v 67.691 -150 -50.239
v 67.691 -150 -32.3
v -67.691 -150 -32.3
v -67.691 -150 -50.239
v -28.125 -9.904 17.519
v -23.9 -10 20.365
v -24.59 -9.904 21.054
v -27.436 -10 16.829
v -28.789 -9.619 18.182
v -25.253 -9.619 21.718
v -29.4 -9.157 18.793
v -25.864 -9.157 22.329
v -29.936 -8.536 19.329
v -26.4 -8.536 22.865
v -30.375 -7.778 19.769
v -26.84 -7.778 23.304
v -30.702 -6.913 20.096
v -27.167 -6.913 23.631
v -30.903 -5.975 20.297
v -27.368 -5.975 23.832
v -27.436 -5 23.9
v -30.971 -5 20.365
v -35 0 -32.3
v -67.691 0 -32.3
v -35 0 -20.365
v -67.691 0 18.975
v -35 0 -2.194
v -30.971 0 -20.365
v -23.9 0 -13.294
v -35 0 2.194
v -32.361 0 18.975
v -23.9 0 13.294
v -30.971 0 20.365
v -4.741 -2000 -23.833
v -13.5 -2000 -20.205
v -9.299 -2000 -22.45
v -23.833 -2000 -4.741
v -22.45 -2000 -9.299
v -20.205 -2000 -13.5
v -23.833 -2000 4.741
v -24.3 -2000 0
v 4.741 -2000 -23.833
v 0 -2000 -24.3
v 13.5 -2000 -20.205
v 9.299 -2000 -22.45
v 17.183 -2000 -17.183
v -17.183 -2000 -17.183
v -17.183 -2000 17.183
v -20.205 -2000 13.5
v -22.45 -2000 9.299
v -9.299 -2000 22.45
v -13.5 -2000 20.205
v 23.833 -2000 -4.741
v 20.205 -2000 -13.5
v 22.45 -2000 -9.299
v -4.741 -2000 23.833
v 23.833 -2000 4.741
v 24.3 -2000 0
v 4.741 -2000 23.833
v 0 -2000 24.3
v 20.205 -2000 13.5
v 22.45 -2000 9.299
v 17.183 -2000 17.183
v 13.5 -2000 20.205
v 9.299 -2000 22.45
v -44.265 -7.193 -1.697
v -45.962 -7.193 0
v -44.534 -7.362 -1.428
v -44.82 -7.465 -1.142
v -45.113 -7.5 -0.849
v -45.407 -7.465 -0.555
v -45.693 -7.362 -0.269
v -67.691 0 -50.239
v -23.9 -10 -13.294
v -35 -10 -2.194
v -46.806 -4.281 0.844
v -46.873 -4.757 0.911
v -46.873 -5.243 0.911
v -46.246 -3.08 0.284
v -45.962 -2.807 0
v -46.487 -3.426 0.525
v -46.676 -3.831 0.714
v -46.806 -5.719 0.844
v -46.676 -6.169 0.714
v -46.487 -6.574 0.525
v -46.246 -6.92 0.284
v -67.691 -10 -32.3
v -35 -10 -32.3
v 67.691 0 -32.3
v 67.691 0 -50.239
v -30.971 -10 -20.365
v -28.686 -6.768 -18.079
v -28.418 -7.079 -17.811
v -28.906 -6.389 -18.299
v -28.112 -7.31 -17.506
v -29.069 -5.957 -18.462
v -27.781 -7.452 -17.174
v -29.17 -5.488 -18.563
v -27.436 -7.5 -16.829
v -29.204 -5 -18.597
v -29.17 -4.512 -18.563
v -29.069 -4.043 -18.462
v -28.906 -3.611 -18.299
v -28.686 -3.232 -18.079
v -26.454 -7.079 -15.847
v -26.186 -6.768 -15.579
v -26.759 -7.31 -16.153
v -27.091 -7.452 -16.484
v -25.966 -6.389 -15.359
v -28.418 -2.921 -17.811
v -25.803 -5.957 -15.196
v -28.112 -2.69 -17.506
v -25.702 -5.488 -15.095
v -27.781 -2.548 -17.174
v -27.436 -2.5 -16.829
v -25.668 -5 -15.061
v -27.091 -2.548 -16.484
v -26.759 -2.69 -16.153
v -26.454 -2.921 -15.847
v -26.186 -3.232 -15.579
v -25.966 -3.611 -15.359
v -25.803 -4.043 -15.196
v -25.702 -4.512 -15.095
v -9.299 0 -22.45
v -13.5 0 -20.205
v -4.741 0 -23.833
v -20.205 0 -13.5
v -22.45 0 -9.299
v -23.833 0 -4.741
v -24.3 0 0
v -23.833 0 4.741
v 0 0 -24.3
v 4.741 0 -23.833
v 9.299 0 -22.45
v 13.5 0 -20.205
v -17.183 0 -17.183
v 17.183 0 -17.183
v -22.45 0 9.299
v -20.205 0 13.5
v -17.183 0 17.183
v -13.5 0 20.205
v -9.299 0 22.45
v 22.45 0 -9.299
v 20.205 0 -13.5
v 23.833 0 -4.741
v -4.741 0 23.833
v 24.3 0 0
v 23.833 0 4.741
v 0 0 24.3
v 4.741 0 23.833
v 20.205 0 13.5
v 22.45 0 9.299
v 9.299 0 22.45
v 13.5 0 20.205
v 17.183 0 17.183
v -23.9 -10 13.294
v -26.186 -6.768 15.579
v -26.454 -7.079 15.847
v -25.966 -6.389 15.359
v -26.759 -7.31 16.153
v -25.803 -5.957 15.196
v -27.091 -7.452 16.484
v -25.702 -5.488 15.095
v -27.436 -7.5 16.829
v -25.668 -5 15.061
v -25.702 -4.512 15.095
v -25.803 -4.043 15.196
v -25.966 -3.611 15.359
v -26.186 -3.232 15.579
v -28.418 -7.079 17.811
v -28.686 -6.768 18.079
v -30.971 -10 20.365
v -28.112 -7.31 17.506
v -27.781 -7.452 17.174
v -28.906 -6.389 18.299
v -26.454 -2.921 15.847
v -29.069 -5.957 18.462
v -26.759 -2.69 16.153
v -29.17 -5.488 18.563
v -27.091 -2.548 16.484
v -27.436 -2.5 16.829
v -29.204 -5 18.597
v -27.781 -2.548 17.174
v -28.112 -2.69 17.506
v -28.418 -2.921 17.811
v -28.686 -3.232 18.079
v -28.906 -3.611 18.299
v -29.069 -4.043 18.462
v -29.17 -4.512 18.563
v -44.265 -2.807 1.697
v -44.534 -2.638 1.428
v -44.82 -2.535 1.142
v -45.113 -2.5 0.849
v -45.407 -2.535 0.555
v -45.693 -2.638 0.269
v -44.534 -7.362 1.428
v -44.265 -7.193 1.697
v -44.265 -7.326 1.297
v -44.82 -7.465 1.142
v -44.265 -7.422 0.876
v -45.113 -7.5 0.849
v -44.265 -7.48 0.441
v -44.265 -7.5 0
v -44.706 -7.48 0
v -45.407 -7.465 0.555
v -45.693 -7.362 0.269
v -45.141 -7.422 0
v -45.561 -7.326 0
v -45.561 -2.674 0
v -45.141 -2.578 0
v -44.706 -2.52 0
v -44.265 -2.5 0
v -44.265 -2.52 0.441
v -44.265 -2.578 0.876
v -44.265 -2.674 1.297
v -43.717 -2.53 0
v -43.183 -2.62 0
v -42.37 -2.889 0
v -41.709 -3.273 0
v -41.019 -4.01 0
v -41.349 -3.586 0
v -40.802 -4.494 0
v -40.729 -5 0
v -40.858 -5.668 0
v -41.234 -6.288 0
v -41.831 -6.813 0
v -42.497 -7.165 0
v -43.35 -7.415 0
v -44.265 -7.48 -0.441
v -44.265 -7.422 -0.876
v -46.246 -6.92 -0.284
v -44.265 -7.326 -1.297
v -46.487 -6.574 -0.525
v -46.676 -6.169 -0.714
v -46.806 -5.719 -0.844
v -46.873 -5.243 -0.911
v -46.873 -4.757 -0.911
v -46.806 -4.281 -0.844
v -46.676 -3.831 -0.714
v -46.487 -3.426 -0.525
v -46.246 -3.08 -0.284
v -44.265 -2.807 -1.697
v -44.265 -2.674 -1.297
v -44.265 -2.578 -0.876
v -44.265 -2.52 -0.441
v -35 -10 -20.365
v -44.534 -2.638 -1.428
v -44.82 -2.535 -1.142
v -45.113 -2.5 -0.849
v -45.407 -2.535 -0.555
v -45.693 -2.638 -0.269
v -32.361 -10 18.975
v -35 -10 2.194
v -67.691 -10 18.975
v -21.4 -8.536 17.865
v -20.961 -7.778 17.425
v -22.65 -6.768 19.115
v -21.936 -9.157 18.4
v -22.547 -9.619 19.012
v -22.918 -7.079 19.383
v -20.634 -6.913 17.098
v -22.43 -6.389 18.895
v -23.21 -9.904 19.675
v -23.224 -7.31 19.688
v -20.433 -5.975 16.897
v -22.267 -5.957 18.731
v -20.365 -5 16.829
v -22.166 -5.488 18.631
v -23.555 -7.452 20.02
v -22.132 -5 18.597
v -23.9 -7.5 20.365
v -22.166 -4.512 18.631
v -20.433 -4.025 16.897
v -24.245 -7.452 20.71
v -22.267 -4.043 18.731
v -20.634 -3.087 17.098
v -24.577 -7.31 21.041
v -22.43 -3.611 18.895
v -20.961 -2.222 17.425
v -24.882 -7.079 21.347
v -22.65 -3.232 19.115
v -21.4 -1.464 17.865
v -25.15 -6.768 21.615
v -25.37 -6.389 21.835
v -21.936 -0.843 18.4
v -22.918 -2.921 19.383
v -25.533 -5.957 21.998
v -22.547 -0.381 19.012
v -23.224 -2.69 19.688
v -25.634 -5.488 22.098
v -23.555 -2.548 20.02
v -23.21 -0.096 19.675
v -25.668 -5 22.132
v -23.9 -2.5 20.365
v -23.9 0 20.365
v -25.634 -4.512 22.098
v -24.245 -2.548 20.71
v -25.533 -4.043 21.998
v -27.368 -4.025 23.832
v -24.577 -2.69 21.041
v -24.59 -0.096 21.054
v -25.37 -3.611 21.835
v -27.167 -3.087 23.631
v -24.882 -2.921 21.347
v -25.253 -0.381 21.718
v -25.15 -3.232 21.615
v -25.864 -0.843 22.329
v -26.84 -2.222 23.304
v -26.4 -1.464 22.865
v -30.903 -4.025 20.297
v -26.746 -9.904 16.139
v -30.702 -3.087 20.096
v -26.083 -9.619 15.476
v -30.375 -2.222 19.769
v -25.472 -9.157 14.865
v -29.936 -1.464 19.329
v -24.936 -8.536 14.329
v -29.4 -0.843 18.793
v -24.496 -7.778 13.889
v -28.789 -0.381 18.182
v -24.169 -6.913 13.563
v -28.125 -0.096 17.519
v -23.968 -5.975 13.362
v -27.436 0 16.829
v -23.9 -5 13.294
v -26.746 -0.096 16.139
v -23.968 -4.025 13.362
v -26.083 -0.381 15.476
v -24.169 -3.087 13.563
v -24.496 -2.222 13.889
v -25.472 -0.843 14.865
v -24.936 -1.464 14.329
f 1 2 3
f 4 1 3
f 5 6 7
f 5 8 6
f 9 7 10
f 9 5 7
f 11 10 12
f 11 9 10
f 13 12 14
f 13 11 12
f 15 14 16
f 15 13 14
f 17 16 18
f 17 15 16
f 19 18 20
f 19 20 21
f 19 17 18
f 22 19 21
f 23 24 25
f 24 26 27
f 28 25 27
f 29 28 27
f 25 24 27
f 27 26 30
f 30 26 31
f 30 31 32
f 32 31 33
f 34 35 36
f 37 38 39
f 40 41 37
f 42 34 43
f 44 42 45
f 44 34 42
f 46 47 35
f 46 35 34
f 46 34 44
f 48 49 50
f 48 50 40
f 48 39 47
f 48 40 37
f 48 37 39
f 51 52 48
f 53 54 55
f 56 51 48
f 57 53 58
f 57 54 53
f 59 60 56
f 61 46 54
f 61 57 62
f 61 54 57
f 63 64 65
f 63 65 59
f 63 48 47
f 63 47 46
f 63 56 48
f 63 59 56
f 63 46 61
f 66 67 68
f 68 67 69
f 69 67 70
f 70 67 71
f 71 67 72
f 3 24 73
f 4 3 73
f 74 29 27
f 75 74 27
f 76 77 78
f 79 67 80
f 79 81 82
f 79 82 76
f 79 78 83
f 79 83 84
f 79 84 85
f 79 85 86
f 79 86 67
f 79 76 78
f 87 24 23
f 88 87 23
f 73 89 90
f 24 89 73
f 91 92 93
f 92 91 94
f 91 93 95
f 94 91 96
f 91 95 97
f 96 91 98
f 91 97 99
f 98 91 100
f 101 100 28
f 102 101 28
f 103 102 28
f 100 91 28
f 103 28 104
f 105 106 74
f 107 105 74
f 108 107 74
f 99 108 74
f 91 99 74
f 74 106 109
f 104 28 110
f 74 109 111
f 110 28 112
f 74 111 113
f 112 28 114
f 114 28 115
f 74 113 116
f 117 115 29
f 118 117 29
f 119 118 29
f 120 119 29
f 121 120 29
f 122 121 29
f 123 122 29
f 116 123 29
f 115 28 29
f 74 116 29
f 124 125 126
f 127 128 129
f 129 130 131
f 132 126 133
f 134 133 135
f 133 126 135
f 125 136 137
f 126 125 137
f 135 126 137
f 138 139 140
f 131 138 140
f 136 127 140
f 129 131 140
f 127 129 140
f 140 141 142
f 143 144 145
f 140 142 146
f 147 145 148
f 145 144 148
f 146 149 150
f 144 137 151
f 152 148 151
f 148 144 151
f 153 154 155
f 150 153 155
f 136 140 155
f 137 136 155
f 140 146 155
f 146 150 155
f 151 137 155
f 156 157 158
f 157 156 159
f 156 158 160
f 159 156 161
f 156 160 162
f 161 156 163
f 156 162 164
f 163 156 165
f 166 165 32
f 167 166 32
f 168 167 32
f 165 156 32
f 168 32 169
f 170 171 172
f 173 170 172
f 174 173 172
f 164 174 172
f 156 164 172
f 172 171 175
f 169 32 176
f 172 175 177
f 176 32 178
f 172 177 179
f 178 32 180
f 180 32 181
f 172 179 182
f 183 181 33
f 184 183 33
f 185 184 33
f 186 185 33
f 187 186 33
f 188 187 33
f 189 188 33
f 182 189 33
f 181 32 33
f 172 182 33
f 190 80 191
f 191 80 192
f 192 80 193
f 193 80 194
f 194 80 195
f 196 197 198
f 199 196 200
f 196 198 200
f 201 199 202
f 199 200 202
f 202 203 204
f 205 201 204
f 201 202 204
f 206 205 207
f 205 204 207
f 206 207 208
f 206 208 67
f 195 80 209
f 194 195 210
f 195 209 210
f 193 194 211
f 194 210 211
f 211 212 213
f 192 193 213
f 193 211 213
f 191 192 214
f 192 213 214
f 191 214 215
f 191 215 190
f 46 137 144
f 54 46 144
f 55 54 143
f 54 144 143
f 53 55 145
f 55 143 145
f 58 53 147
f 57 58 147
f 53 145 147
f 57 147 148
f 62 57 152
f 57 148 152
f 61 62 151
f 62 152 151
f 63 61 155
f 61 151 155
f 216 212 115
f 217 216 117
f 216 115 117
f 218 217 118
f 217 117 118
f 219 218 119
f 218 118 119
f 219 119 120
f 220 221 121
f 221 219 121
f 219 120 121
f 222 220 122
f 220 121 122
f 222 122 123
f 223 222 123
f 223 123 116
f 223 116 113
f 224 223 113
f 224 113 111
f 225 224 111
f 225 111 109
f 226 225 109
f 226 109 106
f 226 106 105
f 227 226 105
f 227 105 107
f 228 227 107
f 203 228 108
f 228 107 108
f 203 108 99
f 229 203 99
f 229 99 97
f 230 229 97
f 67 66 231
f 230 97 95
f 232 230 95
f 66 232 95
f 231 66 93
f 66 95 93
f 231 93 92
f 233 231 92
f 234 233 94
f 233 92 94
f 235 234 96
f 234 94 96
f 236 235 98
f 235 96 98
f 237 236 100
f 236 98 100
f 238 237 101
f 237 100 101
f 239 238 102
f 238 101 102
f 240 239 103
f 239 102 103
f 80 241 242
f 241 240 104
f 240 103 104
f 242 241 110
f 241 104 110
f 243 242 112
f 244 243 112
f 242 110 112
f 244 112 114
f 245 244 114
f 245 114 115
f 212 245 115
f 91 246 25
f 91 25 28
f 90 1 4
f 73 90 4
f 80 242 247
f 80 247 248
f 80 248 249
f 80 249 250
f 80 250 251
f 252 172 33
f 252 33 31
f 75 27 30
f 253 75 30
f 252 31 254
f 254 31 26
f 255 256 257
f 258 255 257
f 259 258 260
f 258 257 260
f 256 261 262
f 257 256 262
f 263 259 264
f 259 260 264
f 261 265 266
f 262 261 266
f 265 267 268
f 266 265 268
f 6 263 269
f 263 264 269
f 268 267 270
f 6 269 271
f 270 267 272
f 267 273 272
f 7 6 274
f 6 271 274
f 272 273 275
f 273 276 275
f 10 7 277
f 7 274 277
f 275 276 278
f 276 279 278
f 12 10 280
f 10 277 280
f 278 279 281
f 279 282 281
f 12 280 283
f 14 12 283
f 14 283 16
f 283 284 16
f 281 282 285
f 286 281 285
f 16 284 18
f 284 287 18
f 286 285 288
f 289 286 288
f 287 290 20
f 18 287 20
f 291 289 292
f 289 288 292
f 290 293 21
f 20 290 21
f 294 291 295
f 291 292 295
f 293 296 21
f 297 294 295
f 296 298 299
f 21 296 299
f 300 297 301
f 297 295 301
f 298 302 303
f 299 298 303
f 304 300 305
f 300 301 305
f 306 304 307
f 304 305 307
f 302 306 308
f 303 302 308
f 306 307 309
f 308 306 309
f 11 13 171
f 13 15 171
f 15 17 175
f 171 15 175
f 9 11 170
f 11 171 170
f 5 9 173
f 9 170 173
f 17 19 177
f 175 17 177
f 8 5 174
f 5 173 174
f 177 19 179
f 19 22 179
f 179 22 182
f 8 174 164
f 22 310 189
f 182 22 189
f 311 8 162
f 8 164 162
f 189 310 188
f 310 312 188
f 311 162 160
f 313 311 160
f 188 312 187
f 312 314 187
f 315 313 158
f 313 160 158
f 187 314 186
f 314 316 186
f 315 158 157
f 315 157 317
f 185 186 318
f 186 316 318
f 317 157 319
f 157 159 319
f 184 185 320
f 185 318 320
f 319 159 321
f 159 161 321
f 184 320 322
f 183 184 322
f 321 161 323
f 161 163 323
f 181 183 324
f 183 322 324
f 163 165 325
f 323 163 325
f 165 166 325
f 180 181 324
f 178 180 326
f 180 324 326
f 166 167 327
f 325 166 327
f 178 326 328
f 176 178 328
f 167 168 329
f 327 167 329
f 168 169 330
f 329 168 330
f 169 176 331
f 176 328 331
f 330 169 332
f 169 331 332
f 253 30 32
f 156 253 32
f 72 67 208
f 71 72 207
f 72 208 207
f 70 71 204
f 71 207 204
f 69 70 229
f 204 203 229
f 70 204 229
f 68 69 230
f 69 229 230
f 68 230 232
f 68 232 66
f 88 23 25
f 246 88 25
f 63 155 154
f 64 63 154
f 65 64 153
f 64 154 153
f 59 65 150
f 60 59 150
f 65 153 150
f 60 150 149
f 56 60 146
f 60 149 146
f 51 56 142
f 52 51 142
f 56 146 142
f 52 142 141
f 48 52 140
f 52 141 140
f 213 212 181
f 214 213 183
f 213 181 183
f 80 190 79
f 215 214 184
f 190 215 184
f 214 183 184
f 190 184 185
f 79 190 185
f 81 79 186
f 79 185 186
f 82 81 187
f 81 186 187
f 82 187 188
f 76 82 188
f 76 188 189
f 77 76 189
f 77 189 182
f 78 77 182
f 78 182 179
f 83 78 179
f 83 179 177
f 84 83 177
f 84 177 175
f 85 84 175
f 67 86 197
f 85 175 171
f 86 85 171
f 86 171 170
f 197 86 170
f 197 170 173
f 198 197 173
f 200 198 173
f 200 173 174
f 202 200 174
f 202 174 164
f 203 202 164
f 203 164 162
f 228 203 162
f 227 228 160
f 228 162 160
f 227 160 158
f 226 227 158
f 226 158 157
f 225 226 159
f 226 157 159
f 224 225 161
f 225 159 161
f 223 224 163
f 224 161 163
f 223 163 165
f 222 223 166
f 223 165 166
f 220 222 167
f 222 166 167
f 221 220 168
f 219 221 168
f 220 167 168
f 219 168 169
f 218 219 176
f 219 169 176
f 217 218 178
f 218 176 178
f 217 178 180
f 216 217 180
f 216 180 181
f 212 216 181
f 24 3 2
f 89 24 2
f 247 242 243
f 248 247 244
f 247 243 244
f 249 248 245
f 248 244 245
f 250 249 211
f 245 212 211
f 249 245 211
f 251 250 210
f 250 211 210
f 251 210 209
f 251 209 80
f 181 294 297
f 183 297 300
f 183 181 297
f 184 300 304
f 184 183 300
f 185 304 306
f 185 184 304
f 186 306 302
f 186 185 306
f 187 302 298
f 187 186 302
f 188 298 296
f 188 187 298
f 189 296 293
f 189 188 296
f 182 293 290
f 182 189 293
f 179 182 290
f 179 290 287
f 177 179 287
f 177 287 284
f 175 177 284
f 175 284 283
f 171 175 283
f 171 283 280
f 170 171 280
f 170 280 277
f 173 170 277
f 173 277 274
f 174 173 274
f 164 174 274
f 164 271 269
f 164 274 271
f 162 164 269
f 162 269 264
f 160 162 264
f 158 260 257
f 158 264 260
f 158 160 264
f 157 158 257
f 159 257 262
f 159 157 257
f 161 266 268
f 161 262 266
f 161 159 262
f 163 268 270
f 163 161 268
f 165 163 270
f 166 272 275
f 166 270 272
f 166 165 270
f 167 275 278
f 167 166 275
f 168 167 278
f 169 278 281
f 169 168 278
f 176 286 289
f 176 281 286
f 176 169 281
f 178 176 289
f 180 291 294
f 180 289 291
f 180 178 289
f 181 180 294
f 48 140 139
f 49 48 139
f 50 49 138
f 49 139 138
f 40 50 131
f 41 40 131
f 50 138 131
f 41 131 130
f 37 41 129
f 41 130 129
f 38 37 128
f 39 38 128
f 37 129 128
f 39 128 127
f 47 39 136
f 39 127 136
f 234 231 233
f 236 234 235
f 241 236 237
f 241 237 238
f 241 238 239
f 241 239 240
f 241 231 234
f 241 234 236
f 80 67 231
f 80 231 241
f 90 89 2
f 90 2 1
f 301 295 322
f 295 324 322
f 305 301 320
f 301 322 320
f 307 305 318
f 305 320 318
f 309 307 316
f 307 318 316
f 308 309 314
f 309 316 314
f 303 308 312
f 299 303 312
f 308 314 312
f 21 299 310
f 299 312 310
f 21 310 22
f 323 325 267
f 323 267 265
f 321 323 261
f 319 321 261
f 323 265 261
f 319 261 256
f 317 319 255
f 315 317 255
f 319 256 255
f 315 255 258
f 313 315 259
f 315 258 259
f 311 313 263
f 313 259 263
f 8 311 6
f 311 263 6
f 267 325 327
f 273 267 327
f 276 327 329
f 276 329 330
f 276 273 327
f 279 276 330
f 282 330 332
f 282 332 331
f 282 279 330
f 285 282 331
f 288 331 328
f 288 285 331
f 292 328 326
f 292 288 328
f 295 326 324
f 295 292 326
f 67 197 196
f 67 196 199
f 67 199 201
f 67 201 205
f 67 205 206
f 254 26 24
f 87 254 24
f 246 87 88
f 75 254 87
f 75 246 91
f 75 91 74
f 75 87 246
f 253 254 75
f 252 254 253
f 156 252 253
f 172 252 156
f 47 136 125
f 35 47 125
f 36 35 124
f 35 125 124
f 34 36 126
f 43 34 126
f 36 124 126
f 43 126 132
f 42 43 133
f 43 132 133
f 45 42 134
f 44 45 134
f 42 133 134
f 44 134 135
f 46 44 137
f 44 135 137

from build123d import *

# Parameters (mm, degrees)
F1_DEPTH  = 2000
F2_DEPTH  = 10
F3_R      = 2.5
F4_DEPTH  = 25
F5_R      = 2.5
F6_DEPTH  = 25
F7_DEPTH  = 150
F9_DEPTH  = 10
F10_DEPTH = 25
F11_R     = 4.99999


# Not quite as in the source:
# - a fillet or chamfer is up to 0.001 mm smaller than in the source, because OpenCascade refuses the exact size


with BuildPart() as f1:
    # F0 (on Front) → F1 (new body)
    with BuildSketch(Plane.XZ):
        with BuildLine():
            ThreePointArc((17.1826947828, -17.1826947828), (22.45027264, -9.2992074065), (24.3, 0))
            ThreePointArc((24.3, 0), (22.45027264, 9.2992074065), (17.1826947828, 17.1826947828))
            ThreePointArc((17.1826947828, 17.1826947828), (0, 24.3), (-17.1826947828, 17.1826947828))
            ThreePointArc((-17.1826947828, 17.1826947828), (-24.3, 0), (-17.1826947828, -17.1826947828))
            ThreePointArc((-17.1826947828, -17.1826947828), (0, -24.3), (17.1826947828, -17.1826947828))
        make_face()
    extrude(amount=F1_DEPTH)


with BuildPart() as f2:
    # F0 (on Front) → F2 (new body)
    with BuildSketch(Plane.XZ):
        Polygon((-35, 2.1938166904), (-23.9002092041, 13.2936074863), (-30.971277016, 20.3646752982), (-32.360868023, 18.9750842911), (-35, 16.3359523141), align=None)
        Polygon((-35, 16.3359523141), (-32.360868023, 18.9750842911), (-35, 18.9750842911), align=None)
        Polygon((-35, -2.1938166904), (-35, 2.1938166904), (-35, 16.3359523141), (-35, 18.9750842911), (-67.6910728216, 18.9750842911), (-67.6910728216, -32.3), (-35, -32.3), (-35, -20.3646752982), (-35, -16.3359523141), align=None)
        Polygon((-23.9002092041, -13.2936074863), (-35, -2.1938166904), (-35, -16.3359523141), (-30.971277016, -20.3646752982), align=None)
        Polygon((-30.971277016, -20.3646752982), (-35, -16.3359523141), (-35, -20.3646752982), align=None)
    extrude(amount=F2_DEPTH)

    # F3 (on face) → F4 (cut)
    with BuildSketch(Plane(origin=(-5.3033008589, 0, -5.3033008589), x_dir=(0, 1, 0), z_dir=(0.7071067812, 0, 0.7071067812))):
        with Locations((-5, 31.3)):
            Circle(F3_R)
    extrude(amount=-F4_DEPTH, mode=Mode.SUBTRACT)

    # F5 (on face) → F6 (cut)
    with BuildSketch(Plane(origin=(-5.3033008589, 0, 5.3033008589), x_dir=(0, 1, 0), z_dir=(0.7071067812, 0, -0.7071067812))):
        with Locations((-5, -31.3)):
            Circle(F5_R)
    extrude(amount=-F6_DEPTH, mode=Mode.SUBTRACT)


with BuildPart() as f7:
    # F0 (on Front) → F7 (new body)
    with BuildSketch(Plane.XZ):
        Polygon((-35, -32.3), (-67.6910728216, -32.3), (-67.6910728216, -50.238545984), (0, -50.238545984), (0, -32.3), align=None)
    extrude(amount=F7_DEPTH)

    # F8: F7 across face


with BuildPart() as f7_1:
    add(f7.part)
    add(f7.part.mirror(Plane(origin=(0, -75, -41.269272992), x_dir=(0, 1, 0), z_dir=(1, 0, 0))))


with BuildPart() as f9:
    # F0 (on Front) → F9 (new body)
    with BuildSketch(Plane.XZ):
        Polygon((-23.9002092041, 13.2936074863), (-20.3646752982, 16.8291413922), (-27.43574311, 23.9002092041), (-30.971277016, 20.3646752982), align=None)
    extrude(amount=F9_DEPTH)

    # F3 (on face) → F10 (cut)
    with BuildSketch(Plane(origin=(-5.3033008589, 0, -5.3033008589), x_dir=(0, 1, 0), z_dir=(0.7071067812, 0, 0.7071067812))):
        with Locations((-5, 31.3)):
            Circle(F3_R)
    extrude(amount=F10_DEPTH, mode=Mode.SUBTRACT)

    # F11 (radius 5 in the source; OpenCascade refuses exactly that, so slightly less here)
    f11_edges = [f9.edges().sort_by_distance(p)[0] for p in [
        (-29.20351, 0, 22.132442),
        (-29.20351, -10, 22.132442),
        (-22.132442, -10, 15.061374),
        (-22.132442, 0, 15.061374),
    ]]
    fillet(f11_edges, radius=F11_R)


solid = Compound([f1.part, f2.part, f7_1.part, f9.part])
